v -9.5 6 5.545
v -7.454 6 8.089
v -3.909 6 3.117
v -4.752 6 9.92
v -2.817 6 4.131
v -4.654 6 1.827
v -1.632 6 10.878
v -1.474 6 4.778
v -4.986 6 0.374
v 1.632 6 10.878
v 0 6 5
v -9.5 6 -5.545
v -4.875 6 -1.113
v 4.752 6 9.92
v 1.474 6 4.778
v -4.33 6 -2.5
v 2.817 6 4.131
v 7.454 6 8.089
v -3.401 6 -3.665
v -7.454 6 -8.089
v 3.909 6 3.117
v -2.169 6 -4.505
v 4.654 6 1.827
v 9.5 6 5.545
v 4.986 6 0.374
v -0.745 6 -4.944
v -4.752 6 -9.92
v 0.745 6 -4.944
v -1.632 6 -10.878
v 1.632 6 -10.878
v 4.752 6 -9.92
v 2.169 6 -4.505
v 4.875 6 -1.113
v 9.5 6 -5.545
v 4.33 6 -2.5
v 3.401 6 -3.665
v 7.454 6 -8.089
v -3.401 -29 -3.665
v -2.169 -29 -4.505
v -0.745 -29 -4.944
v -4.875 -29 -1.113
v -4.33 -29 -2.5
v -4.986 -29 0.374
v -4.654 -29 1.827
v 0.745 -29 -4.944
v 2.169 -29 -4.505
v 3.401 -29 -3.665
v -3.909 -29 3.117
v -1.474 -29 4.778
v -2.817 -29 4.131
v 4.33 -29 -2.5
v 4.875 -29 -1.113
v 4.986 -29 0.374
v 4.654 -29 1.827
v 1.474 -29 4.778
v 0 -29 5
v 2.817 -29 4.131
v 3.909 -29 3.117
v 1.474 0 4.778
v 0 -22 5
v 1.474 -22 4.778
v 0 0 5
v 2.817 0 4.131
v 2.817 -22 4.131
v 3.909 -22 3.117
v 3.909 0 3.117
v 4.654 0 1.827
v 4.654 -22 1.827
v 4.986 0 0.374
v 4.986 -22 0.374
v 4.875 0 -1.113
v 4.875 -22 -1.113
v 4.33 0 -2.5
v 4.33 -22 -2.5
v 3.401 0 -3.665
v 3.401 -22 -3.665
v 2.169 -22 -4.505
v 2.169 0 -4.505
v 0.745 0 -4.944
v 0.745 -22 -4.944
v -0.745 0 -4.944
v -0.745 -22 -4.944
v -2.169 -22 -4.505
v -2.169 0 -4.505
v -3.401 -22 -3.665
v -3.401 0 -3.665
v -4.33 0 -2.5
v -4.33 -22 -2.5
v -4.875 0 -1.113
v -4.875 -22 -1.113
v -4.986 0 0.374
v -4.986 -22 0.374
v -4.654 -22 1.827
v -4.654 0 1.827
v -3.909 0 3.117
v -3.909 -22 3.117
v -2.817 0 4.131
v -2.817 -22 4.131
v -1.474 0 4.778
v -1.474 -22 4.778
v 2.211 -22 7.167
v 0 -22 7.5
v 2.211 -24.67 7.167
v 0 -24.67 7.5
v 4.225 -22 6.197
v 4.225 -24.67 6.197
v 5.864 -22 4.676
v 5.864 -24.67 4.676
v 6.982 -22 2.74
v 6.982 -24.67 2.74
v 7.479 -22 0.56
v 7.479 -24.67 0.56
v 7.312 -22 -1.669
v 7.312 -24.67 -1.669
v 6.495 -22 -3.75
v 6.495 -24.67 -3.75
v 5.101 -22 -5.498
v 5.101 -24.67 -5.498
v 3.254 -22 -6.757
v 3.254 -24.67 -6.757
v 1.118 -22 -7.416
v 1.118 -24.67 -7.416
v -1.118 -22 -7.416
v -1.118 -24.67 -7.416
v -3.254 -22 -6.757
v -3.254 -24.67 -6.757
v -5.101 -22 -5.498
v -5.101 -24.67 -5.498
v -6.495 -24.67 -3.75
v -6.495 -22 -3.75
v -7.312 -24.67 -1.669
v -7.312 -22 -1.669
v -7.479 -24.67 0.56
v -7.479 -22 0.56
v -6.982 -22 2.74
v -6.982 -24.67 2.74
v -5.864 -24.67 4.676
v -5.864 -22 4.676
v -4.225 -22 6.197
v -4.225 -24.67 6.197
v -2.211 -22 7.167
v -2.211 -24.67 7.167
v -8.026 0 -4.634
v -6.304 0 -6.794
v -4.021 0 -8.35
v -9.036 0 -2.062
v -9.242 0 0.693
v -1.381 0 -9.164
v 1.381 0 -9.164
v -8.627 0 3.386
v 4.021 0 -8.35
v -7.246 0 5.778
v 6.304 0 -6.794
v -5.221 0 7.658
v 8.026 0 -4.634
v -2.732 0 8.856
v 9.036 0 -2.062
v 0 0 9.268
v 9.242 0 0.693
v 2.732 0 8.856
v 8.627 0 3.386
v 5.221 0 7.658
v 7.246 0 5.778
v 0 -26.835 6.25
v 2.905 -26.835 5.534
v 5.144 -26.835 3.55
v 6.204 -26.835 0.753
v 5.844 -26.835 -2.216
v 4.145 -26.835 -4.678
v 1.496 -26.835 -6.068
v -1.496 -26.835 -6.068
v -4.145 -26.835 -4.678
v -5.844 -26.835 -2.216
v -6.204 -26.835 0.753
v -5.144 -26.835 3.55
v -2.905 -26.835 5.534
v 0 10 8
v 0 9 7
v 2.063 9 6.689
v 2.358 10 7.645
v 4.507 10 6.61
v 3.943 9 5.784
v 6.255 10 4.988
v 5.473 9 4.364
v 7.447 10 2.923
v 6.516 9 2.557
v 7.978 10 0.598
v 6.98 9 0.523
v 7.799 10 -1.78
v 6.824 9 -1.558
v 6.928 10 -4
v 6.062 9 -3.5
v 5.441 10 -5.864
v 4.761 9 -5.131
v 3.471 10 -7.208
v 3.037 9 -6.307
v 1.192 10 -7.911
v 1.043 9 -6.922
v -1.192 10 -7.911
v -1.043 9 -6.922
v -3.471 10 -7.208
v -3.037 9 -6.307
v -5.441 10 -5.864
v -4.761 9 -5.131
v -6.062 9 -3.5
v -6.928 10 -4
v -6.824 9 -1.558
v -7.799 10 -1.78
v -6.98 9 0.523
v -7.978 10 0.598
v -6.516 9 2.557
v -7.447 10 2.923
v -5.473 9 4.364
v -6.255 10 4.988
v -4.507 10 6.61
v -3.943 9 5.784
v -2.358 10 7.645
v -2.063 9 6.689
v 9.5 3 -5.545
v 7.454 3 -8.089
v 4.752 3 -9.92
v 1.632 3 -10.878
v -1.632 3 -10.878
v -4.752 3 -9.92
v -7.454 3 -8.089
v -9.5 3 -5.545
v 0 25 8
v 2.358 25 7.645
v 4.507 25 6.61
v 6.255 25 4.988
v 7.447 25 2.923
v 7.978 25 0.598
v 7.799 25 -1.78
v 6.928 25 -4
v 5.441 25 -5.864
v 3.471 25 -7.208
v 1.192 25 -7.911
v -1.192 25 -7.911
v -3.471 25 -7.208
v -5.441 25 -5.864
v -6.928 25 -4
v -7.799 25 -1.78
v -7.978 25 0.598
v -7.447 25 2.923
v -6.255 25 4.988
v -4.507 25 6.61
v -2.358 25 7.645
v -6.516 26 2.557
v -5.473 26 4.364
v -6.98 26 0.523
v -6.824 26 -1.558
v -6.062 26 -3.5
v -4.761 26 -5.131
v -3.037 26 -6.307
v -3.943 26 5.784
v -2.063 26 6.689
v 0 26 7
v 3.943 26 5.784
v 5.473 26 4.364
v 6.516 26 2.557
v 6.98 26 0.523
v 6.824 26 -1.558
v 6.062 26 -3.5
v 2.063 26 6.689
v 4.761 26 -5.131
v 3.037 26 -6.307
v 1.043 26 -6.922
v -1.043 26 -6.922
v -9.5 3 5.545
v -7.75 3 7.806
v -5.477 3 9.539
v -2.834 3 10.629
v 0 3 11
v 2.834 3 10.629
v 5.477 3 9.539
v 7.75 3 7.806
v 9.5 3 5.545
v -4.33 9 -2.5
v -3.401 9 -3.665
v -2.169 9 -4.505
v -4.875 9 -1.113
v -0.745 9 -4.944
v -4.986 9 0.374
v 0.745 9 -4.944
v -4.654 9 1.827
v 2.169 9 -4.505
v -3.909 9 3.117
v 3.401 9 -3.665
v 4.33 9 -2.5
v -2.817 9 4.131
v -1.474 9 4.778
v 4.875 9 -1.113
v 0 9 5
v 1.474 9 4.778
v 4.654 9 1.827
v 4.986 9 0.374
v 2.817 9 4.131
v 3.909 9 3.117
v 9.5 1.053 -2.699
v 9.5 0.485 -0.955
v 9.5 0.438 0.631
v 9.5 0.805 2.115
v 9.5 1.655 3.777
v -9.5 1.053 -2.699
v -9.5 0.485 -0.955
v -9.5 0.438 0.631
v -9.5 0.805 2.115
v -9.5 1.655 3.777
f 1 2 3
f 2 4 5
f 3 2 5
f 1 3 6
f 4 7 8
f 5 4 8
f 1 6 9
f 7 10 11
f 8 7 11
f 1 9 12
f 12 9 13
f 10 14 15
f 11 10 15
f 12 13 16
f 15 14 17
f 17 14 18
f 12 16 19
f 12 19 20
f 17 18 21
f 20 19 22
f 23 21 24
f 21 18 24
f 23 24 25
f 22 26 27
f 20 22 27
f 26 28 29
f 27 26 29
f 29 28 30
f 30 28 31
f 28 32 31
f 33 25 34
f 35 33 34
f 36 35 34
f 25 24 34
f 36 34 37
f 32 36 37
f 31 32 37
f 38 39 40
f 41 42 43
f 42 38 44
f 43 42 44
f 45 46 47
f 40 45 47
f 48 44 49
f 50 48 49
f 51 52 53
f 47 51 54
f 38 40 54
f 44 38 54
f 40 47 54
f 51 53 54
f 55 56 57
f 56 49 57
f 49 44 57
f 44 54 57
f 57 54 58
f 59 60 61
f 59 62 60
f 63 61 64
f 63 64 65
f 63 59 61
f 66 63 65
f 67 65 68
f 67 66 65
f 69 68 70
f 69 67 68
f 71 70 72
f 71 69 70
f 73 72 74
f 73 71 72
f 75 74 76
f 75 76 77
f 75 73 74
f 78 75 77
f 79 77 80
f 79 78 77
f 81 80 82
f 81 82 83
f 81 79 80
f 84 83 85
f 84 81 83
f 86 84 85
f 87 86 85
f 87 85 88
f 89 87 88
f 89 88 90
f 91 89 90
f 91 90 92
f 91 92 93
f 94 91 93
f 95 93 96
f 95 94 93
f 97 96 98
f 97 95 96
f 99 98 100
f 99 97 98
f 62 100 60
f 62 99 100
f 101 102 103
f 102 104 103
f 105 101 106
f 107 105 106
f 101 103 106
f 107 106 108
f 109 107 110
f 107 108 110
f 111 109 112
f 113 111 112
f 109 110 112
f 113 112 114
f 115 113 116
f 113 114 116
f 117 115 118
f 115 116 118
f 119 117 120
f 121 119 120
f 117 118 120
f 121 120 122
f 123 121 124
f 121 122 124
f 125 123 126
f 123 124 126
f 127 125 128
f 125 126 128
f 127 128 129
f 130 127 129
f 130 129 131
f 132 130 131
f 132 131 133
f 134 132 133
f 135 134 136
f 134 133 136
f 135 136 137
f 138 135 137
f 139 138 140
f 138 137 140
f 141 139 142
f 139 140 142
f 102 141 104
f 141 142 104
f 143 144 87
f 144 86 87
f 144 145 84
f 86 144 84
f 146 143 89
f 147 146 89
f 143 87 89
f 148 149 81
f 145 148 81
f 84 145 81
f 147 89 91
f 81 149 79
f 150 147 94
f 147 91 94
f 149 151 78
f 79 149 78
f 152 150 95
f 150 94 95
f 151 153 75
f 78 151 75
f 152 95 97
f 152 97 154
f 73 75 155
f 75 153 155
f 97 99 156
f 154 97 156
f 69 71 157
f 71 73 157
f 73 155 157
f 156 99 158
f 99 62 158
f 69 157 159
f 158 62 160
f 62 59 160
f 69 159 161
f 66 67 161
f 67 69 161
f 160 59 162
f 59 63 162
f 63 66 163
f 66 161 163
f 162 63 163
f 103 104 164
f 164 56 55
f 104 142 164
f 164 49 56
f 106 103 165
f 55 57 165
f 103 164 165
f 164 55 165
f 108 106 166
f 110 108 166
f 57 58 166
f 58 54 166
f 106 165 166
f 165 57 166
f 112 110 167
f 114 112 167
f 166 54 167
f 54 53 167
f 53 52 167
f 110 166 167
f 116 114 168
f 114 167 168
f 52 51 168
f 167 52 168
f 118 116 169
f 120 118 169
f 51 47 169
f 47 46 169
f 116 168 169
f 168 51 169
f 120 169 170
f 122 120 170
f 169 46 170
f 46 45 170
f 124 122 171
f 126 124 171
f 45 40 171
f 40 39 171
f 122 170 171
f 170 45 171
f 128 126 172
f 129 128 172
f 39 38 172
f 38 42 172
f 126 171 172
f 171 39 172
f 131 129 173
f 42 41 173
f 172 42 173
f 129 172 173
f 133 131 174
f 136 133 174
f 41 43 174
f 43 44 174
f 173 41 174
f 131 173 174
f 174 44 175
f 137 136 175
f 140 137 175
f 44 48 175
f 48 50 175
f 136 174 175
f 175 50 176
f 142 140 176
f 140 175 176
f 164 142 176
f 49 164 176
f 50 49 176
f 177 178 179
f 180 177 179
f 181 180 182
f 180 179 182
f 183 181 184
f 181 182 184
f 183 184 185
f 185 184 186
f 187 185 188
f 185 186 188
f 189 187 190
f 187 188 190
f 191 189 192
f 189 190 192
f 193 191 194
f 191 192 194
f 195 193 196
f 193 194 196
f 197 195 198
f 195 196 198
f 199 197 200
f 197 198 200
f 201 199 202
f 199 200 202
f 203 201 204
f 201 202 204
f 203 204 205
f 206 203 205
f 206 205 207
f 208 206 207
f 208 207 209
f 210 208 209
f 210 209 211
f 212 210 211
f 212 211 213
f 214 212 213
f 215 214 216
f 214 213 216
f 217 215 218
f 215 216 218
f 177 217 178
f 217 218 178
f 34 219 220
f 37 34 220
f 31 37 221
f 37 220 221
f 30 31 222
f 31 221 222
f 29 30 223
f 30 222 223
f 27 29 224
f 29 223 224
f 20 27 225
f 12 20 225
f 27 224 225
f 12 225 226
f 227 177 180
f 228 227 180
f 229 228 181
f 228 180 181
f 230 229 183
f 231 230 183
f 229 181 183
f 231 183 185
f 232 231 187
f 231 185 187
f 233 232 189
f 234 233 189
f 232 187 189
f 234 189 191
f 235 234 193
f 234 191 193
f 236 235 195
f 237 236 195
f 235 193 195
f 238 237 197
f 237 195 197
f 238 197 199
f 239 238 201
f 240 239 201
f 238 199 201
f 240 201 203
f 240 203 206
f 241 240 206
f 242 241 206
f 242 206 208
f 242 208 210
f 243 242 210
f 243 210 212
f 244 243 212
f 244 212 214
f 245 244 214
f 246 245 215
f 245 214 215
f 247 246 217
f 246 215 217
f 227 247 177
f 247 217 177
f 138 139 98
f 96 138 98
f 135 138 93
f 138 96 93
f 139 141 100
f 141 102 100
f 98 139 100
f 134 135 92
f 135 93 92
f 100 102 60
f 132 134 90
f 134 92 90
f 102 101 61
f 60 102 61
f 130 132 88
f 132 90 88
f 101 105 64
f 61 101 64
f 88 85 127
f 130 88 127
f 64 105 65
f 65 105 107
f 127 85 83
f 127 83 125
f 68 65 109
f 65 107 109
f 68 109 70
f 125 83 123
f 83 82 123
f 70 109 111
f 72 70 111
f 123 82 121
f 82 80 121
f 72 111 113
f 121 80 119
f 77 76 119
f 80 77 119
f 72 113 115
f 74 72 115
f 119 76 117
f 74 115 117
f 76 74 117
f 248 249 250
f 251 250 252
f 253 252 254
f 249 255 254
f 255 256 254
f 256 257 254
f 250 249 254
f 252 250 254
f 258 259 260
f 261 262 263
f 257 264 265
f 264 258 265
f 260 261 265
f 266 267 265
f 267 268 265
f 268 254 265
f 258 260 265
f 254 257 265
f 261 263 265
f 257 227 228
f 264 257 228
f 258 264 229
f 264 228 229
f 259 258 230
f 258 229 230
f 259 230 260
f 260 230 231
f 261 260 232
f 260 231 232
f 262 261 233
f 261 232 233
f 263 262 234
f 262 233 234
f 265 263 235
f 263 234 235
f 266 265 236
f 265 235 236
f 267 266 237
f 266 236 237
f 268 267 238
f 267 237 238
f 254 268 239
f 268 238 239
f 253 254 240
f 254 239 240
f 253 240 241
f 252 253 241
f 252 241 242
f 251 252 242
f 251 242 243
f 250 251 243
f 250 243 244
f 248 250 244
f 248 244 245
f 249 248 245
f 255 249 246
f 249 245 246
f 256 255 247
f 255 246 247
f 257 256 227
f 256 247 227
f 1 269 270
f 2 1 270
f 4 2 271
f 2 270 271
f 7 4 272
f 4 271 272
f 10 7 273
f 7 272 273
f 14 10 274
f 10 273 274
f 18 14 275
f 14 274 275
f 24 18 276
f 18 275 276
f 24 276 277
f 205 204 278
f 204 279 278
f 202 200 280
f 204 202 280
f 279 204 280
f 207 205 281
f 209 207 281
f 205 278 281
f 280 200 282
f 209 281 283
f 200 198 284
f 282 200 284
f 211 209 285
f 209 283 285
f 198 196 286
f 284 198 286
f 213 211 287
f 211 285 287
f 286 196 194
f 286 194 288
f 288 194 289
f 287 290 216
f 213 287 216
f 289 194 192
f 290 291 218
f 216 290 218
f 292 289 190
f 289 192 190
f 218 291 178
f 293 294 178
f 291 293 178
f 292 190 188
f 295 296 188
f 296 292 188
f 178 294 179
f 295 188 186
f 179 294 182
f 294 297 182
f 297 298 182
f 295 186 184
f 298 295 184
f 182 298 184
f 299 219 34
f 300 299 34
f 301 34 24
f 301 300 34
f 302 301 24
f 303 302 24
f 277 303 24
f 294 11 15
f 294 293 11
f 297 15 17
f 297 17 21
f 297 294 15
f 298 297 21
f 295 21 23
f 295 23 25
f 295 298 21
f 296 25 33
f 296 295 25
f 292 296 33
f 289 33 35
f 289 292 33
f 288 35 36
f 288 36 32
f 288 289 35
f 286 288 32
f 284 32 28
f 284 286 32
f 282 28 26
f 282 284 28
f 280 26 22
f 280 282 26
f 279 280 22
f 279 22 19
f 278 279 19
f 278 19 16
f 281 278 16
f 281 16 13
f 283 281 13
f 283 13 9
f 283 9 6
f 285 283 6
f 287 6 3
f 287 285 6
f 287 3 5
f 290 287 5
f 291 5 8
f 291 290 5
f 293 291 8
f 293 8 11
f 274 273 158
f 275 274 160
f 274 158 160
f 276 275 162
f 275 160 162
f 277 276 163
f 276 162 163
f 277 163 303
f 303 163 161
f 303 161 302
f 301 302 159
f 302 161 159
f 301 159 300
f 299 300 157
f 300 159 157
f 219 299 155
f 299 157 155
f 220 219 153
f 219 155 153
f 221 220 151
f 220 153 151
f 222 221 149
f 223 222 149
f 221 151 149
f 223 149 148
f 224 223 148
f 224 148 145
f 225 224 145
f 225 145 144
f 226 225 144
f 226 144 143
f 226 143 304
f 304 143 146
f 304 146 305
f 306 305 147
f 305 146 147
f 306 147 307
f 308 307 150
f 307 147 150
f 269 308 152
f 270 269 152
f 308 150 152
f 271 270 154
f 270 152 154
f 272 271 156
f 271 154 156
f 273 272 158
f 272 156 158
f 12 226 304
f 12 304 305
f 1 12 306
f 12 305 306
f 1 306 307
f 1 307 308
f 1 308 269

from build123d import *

# Parameters (mm, degrees)
F0_W     = 22
F0_H     = 5
F0_W_2   = 3
F2_SIZE  = 1
F3_W     = 3
F3_H     = 11.090536
F4_DEPTH = 27.256256


with BuildPart() as f1:
    # F0 (on Right) → F1 (revolve)
    with BuildSketch(Plane.YZ):
        with Locations((-11, 2.5)):
            Rectangle(F0_W, F0_H)
        Polygon((0, 5), (0, 0), (3, 0), (3, 11), (0, 9.267949), align=None)
        Polygon((-24.669873, 0), (-22, 0), (-22, 5), (-22, 7.5), (-24.669873, 7.5), align=None)
        Polygon((3, 11), (3, 0), (6, 0), (6, 5), (6, 11), align=None)
        Polygon((-29, 0), (-24.669873, 0), (-24.669873, 7.5), (-29, 5), align=None)
        with Locations((7.5, 2.5)):
            Rectangle(F0_W_2, F0_H)
        Polygon((9, 5), (9, 0), (26, 0), (26, 8), (9, 8), align=None)
    revolve(axis=Axis((0, 0.418028, 0), (0, 1, 0)))

    # F2
    f2_edges = [f1.edges().sort_by_distance(p)[0] for p in [
        (0, 9, -8),
        (0, 26, -8),
    ]]
    chamfer(f2_edges, length=F2_SIZE)

    # F3 (on Front) → F4 (cut)
    with BuildSketch(Plane.XZ):
        with Locations((11, 0)):
            Rectangle(F3_W, F3_H)
        with Locations((-11, 0)):
            Rectangle(F3_W, F3_H)
    extrude(amount=-F4_DEPTH, mode=Mode.SUBTRACT)


solid = f1.part
